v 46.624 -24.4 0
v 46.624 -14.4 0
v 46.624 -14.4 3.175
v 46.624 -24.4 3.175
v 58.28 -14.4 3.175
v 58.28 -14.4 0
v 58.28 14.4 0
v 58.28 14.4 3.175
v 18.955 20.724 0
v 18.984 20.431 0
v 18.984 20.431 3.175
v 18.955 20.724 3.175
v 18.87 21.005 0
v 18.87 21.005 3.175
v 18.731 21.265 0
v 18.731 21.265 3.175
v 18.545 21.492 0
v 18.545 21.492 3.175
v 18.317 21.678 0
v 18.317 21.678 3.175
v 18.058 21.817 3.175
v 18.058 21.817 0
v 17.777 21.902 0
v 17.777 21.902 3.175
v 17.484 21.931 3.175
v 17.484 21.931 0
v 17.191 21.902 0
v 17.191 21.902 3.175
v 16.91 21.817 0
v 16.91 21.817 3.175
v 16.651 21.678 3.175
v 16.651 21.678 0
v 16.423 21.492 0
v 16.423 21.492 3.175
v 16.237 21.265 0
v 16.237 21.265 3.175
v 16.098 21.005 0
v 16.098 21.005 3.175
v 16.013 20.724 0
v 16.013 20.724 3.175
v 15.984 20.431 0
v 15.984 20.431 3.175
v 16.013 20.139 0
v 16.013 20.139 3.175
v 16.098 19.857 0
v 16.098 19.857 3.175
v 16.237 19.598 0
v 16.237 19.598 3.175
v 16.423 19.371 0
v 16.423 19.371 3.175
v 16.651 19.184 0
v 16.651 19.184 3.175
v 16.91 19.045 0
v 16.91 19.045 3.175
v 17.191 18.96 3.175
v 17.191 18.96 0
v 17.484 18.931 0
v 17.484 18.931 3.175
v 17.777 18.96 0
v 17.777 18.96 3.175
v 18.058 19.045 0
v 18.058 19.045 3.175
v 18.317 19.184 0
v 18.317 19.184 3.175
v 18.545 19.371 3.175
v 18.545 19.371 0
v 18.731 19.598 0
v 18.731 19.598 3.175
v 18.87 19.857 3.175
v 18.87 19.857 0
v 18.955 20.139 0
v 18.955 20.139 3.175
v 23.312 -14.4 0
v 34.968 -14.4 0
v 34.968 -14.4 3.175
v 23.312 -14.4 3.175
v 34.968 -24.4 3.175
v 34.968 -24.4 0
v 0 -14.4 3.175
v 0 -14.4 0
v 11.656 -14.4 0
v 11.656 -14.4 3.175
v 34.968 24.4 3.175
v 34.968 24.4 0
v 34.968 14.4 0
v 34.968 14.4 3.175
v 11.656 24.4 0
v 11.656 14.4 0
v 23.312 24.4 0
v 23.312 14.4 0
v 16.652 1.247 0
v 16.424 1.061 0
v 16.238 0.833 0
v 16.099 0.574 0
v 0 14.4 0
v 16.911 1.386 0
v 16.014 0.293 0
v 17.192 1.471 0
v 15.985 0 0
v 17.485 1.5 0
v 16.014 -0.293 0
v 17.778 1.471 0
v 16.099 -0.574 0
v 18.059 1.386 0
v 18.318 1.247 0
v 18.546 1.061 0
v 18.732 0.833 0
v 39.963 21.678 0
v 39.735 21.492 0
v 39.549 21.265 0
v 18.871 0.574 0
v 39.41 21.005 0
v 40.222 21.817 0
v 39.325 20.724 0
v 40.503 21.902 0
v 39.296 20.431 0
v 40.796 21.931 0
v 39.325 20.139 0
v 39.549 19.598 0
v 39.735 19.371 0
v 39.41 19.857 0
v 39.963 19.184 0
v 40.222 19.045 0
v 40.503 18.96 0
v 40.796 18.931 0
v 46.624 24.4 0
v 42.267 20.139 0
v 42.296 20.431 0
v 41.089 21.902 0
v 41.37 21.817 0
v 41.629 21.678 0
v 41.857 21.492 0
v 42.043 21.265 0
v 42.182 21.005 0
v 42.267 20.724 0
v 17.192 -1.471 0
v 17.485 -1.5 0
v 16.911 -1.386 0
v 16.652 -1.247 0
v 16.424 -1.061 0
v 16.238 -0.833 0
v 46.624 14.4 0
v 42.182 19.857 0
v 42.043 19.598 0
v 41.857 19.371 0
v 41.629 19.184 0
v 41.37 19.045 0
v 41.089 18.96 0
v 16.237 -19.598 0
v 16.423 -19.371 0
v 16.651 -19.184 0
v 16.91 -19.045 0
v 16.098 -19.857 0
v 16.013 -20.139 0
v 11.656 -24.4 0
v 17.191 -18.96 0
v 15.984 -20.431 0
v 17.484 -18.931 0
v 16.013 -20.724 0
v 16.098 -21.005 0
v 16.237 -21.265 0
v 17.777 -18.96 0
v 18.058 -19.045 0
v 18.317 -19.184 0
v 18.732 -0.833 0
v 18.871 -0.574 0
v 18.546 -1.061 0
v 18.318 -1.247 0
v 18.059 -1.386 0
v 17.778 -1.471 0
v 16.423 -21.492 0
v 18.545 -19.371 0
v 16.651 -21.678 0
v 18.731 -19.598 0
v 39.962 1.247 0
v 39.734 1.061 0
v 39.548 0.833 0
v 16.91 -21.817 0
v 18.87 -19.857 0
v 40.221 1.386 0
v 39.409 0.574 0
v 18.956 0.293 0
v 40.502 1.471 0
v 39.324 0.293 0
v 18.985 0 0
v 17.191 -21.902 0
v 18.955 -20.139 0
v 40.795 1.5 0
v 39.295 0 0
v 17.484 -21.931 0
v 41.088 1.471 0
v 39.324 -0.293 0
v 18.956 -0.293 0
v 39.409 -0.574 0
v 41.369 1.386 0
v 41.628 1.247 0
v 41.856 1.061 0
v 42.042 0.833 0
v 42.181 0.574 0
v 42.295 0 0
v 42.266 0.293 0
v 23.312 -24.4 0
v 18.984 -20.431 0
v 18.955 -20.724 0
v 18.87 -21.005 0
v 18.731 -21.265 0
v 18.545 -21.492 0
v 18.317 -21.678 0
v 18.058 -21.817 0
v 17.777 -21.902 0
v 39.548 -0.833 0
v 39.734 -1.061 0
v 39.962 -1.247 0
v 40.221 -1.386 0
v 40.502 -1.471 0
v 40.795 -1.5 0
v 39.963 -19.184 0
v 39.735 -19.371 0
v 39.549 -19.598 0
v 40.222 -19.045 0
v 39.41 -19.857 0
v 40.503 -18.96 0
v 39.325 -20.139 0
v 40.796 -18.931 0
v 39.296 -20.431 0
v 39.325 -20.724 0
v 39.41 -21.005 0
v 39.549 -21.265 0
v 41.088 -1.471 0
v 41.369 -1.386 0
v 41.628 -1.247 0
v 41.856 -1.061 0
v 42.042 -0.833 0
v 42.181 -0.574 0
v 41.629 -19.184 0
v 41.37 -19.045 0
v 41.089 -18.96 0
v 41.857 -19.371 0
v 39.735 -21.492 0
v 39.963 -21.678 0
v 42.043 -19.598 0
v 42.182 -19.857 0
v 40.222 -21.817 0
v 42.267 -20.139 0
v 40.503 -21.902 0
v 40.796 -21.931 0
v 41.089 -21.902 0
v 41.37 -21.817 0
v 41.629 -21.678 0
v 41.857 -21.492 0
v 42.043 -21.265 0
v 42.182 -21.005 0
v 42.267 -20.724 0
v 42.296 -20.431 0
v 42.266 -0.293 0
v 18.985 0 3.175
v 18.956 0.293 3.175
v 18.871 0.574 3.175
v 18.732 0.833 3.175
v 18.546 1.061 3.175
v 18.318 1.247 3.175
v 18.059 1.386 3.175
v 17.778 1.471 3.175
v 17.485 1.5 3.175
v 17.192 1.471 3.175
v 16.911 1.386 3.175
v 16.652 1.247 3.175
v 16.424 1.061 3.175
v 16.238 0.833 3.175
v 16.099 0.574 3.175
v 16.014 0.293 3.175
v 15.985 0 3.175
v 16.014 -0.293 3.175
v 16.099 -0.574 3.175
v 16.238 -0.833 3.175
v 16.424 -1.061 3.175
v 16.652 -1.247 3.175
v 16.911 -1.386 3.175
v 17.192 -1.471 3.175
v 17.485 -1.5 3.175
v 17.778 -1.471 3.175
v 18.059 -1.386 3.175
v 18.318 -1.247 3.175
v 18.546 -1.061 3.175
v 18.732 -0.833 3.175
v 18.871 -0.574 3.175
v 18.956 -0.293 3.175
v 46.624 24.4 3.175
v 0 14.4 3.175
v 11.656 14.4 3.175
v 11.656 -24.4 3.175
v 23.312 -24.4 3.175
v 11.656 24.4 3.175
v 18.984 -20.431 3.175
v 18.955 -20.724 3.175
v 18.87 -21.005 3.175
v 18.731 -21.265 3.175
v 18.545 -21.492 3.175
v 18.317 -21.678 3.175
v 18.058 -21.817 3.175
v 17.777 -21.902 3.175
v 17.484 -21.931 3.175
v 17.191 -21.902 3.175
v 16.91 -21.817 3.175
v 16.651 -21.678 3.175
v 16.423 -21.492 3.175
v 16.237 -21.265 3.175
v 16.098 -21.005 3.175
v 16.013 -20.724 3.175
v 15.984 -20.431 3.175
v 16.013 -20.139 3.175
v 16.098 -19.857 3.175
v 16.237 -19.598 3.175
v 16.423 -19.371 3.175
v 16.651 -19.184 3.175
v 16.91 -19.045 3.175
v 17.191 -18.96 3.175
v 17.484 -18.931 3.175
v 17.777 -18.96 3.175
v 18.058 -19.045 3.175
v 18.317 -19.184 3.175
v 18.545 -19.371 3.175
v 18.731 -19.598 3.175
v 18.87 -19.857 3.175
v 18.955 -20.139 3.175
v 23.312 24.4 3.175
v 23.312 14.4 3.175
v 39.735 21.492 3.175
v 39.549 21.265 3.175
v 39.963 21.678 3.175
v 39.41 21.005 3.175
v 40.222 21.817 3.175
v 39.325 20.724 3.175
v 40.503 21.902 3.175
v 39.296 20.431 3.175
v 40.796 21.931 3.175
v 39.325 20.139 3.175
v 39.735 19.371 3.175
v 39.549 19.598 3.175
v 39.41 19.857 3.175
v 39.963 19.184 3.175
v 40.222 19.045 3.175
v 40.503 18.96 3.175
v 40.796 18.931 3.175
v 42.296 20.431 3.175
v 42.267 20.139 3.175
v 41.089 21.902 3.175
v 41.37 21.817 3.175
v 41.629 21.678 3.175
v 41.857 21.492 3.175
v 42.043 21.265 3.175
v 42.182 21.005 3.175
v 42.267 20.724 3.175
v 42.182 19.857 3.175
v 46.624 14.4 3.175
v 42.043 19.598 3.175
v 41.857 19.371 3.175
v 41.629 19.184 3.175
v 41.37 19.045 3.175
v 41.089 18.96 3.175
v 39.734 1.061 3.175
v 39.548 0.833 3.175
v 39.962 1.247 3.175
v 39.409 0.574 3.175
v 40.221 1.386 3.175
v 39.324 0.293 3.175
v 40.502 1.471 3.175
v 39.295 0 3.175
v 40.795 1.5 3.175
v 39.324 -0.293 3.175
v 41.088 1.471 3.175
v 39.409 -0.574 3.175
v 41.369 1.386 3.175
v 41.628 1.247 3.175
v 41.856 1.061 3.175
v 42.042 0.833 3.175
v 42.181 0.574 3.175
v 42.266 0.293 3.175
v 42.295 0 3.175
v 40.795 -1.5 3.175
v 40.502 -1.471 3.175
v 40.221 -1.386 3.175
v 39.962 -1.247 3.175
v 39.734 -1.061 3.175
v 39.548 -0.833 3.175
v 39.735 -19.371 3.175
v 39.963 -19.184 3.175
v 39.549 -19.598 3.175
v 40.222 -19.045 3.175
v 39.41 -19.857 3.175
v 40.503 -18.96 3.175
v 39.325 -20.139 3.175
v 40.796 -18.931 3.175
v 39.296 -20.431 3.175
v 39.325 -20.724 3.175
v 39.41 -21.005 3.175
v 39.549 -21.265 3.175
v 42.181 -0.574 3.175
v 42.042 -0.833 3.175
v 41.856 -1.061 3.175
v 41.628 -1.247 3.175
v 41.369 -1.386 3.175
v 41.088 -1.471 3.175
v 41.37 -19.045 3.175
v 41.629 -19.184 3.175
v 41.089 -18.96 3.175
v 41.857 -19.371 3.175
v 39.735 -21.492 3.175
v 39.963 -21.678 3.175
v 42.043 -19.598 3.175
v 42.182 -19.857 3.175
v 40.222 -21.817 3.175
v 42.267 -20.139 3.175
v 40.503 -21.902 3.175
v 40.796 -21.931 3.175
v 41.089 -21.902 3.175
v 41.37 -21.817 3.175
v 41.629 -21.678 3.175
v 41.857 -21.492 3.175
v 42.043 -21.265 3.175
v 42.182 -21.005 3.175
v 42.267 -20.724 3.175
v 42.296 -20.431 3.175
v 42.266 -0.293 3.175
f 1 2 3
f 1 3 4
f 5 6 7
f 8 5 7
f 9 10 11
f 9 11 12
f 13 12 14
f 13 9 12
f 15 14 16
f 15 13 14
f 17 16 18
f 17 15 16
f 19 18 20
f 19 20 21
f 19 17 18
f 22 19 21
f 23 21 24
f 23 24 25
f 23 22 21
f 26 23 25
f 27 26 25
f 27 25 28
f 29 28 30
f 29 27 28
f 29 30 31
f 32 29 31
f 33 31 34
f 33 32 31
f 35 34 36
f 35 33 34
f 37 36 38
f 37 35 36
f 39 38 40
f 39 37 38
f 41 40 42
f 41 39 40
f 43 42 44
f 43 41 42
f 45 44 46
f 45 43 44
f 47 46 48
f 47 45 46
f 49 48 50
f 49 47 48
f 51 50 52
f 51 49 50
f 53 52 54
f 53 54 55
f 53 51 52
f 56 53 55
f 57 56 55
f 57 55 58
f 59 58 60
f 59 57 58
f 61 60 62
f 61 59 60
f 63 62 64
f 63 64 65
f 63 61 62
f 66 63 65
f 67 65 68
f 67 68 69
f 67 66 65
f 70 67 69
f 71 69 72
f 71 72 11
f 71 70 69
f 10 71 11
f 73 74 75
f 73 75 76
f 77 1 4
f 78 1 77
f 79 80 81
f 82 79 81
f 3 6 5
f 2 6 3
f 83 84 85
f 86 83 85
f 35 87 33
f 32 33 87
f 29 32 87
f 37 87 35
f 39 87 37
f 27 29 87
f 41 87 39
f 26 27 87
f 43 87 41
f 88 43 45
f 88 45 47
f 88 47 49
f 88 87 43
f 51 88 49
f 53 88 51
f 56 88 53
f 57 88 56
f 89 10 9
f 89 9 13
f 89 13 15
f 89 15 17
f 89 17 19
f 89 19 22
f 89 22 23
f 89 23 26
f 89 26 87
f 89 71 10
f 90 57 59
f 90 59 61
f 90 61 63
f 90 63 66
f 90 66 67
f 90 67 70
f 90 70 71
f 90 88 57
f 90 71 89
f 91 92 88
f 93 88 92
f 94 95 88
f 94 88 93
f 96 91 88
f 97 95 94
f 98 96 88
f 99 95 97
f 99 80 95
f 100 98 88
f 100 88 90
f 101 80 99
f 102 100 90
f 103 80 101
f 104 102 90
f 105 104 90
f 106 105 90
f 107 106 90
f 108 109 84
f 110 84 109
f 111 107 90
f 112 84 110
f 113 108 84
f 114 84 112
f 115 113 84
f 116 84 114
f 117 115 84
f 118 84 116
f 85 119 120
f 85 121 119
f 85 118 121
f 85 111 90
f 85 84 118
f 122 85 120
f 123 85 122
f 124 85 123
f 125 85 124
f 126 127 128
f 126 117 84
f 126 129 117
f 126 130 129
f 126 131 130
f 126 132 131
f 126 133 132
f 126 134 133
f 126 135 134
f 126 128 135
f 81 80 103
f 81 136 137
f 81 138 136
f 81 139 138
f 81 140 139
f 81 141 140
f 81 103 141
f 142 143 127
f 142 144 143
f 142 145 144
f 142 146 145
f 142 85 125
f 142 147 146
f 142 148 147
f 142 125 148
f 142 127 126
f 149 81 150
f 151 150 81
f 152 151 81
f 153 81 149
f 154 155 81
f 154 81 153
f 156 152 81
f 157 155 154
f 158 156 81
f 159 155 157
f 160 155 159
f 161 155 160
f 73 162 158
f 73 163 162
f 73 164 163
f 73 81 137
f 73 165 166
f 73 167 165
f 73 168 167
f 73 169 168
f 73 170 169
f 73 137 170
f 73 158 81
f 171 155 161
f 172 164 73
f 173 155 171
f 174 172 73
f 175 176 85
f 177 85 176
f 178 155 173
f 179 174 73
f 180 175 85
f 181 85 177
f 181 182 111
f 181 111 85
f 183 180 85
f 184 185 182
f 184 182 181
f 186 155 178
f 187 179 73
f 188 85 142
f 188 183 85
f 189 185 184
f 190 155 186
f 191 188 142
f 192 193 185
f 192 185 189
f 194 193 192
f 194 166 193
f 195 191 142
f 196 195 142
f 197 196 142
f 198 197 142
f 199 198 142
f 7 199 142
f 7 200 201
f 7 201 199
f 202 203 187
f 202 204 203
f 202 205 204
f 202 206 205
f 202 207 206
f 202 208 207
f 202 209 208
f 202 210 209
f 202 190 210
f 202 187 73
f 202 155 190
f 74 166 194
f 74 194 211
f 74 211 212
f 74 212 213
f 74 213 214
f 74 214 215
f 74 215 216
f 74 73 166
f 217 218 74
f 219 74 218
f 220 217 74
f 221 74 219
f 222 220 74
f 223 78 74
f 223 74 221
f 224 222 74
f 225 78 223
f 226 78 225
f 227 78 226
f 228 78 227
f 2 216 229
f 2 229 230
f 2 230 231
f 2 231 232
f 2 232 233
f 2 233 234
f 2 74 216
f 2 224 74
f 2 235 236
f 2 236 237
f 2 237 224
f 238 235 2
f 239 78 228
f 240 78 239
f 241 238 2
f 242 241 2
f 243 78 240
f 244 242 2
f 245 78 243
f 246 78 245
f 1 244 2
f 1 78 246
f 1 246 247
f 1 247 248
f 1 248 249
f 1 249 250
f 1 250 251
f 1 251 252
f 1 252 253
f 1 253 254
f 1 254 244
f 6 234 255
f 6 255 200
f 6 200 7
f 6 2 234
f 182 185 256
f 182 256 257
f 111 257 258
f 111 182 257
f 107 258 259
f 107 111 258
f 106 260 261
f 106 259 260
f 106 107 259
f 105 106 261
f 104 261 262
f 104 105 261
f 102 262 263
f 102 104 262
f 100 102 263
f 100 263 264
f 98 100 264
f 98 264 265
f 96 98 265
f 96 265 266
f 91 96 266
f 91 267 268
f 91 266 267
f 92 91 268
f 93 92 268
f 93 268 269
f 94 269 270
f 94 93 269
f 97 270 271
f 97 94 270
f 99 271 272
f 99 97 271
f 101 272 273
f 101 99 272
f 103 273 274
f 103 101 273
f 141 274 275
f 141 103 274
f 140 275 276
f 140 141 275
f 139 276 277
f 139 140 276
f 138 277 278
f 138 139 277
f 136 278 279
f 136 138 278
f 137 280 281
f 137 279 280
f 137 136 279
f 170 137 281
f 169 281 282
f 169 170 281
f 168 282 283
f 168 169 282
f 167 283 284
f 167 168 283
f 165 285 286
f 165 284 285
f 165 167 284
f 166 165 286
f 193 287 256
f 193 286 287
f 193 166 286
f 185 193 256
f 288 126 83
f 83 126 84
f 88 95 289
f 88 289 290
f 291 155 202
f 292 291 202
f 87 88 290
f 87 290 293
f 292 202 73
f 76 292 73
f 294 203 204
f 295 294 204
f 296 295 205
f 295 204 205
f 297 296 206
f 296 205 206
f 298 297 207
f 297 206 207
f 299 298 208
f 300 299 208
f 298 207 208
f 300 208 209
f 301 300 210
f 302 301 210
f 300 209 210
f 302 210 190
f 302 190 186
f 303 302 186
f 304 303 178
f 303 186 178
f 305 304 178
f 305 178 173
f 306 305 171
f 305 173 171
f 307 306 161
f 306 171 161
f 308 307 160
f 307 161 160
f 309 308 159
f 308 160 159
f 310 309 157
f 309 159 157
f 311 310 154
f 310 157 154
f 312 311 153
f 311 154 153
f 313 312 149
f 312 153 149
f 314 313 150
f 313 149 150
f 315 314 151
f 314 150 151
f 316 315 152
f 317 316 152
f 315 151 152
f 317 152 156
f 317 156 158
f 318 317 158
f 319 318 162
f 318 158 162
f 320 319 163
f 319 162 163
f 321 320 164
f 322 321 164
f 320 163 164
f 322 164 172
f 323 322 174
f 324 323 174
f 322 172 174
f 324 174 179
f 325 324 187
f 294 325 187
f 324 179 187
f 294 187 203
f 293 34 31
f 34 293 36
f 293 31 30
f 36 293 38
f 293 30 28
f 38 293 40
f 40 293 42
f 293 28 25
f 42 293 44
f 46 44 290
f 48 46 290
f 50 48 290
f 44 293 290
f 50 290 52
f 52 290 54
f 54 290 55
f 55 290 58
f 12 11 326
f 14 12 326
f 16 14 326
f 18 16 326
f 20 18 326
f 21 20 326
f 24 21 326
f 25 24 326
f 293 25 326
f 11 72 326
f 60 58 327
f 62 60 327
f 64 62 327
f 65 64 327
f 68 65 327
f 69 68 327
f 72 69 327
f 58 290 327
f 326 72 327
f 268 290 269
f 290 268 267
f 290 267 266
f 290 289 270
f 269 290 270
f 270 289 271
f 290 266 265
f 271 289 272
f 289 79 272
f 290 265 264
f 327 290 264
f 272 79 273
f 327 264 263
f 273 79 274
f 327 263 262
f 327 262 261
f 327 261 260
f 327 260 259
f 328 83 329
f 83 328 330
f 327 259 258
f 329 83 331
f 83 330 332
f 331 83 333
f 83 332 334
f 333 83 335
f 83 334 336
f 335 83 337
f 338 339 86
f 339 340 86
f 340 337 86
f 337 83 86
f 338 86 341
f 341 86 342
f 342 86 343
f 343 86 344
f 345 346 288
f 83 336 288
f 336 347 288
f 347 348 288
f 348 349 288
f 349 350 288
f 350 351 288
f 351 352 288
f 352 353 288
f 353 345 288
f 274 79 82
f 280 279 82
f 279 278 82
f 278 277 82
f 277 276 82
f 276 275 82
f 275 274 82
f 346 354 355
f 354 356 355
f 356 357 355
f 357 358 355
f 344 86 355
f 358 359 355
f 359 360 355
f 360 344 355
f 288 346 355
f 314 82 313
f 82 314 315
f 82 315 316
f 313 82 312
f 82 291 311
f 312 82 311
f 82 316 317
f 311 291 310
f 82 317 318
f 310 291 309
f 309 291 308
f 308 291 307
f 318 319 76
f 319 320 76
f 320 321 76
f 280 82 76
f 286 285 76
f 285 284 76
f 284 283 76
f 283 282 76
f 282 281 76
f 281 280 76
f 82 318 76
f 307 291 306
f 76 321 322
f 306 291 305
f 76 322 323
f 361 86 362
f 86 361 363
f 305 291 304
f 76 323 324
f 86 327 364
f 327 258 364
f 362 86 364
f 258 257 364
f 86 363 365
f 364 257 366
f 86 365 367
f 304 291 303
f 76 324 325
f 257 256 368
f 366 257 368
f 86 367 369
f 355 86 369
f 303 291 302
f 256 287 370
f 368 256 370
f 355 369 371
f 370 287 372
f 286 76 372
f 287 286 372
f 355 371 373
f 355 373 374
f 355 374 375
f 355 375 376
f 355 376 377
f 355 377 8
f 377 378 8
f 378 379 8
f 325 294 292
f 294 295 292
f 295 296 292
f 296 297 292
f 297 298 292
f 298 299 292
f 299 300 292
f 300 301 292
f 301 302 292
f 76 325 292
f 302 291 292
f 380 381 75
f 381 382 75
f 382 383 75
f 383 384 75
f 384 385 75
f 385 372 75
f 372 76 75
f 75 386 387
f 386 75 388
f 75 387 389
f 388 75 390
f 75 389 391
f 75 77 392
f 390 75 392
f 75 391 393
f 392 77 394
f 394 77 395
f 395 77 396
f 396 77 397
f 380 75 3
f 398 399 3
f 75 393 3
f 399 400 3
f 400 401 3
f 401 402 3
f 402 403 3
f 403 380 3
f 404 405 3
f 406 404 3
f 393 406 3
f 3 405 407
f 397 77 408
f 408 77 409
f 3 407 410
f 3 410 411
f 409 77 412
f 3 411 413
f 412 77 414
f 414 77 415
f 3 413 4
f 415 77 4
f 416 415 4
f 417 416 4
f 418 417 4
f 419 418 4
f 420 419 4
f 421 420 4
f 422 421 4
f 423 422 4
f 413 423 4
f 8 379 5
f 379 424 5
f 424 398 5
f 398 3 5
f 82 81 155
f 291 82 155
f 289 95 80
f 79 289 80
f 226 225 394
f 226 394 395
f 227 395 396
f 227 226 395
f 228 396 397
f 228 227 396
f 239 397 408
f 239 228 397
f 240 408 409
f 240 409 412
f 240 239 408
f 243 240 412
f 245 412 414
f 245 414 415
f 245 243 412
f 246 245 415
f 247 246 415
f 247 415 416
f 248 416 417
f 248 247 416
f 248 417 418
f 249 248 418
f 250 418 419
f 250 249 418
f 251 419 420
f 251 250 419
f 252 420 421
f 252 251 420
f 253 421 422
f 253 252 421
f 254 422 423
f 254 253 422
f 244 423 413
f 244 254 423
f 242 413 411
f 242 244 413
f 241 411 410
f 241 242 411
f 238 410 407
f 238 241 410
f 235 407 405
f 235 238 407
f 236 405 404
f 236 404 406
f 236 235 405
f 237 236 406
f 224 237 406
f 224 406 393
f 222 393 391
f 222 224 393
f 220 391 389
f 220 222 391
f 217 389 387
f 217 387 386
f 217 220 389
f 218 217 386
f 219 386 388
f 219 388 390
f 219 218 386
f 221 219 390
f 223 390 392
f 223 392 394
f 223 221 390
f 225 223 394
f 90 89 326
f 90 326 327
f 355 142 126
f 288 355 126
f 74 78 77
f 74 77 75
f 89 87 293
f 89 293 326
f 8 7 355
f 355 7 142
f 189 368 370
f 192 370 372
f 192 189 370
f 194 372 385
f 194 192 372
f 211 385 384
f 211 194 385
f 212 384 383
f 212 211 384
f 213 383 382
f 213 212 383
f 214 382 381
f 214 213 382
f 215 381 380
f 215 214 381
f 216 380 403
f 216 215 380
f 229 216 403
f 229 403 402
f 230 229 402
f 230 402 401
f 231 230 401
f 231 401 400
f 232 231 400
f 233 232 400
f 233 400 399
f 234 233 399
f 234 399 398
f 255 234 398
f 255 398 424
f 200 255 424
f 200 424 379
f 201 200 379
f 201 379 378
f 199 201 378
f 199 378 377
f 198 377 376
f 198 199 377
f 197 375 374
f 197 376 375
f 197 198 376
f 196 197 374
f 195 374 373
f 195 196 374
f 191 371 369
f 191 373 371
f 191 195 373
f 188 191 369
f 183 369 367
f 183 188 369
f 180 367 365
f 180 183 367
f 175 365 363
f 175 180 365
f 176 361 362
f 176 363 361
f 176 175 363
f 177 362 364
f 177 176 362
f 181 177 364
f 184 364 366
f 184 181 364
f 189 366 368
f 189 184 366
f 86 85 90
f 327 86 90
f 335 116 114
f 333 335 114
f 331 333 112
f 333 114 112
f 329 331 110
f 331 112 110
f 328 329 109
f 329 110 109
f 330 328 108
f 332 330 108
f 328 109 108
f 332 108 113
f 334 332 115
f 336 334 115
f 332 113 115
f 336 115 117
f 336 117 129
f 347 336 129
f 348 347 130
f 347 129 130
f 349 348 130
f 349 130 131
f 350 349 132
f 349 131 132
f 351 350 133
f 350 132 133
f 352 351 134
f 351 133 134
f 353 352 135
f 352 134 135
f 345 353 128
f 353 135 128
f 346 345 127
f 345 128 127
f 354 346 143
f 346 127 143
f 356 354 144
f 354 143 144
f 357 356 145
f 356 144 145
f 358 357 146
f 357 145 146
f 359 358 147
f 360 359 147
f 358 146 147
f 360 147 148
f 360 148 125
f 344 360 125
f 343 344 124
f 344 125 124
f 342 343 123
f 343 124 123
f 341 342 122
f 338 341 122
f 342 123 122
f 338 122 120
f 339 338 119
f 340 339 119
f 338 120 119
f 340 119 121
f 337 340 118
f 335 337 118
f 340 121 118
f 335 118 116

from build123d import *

# Parameters (mm, degrees)
SKETCH2_R           = 1.5
BOSS_EXTRUDE1_DEPTH = 3.175


with BuildPart() as part:
    # Sketch2 → Boss-Extrude1 (new body)
    with BuildSketch(Plane.XY):
        with BuildLine():
            Line((23.312, 14.4), (29.14, 14.4))
            Line((29.14, 14.4), (29.14, 0))
            Line((29.14, 0), (18.985, 0))
            ThreePointArc((18.985, 0), (17.485, 1.5), (15.985, 0))
            Line((15.985, 0), (0, 0))
            Line((0, 0), (0, 14.4))
            Line((0, 14.4), (11.656, 14.4))
            Line((11.656, 14.4), (11.656, 24.4))
            Line((11.656, 24.4), (23.312, 24.4))
            Line((23.312, 24.4), (23.312, 14.4))
        make_face()
        with Locations((17.484, 20.43125)):
            Circle(SKETCH2_R, mode=Mode.SUBTRACT)
    extrude(amount=BOSS_EXTRUDE1_DEPTH)

    # Mirror1: part across plane


with BuildPart() as part_1:
    add(part.part)
    add(part.part.mirror(Plane(origin=(0, 0, 3.175), x_dir=(0, 0, 1), z_dir=(0, 1, 0))))

    # Mirror2: part across plane


with BuildPart() as part_2:
    add(part_1.part)
    add(part_1.part.mirror(Plane(origin=(29.14, 14.4, 3.175), x_dir=(0, 0, 1), z_dir=(-1, 0, 0))))


solid = part_2.part
